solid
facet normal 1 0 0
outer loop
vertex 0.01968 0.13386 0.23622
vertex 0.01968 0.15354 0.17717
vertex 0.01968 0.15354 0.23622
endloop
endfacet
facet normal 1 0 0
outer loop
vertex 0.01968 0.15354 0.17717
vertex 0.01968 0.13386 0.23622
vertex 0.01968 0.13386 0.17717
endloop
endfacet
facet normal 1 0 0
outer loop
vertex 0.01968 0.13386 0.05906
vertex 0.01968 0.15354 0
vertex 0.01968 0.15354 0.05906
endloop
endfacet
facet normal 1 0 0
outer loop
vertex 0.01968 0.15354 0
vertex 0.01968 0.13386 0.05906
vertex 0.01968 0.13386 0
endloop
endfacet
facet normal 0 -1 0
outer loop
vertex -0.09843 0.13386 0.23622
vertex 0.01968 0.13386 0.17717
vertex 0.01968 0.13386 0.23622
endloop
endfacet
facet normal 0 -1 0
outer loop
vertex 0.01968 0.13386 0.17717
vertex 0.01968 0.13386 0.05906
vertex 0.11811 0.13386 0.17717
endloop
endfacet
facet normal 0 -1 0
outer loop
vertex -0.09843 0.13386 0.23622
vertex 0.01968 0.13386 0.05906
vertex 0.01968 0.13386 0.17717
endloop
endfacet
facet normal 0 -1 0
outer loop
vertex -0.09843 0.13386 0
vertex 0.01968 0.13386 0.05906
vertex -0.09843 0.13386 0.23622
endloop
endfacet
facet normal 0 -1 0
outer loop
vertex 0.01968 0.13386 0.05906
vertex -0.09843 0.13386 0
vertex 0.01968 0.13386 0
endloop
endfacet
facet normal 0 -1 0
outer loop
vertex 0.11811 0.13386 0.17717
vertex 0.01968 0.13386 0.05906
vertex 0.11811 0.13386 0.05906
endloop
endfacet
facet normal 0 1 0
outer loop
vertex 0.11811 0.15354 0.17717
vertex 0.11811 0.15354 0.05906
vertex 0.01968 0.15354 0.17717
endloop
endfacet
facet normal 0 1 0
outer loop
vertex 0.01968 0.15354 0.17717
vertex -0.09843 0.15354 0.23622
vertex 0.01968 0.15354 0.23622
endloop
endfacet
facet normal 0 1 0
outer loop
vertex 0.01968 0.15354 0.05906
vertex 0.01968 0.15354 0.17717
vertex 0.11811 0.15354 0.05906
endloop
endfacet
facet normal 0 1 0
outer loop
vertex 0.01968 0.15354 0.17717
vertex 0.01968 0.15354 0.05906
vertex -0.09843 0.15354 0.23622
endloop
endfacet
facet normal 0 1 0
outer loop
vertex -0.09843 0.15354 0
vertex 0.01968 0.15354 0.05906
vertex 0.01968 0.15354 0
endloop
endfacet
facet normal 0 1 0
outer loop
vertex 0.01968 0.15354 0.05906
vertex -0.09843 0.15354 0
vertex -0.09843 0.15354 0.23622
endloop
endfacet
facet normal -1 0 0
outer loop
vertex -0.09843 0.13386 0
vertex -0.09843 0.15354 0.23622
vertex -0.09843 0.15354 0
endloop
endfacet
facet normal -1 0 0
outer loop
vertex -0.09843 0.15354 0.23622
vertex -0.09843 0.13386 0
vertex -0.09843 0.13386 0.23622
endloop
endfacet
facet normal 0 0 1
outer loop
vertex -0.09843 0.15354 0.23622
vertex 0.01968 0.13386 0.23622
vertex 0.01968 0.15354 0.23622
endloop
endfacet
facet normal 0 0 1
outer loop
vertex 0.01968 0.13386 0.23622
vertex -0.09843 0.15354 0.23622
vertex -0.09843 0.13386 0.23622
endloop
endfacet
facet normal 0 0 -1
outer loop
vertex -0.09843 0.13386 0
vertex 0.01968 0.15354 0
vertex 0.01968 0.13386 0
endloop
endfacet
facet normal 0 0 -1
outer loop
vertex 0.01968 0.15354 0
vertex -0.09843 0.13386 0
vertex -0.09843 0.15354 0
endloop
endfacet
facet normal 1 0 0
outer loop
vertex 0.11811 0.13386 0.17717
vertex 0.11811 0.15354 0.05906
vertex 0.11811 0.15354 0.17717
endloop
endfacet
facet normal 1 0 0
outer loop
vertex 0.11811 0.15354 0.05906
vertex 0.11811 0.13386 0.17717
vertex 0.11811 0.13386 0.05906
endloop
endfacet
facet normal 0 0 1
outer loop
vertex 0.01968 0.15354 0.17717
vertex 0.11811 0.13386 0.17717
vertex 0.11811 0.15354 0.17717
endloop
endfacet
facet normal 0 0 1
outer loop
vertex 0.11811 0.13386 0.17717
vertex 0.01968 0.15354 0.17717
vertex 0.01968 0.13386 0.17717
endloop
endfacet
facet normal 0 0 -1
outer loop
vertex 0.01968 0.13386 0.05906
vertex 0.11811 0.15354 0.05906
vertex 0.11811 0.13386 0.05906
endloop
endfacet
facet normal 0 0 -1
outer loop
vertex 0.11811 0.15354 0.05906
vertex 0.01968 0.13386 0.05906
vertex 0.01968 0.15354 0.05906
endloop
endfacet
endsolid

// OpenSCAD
// file: defines.scad
Wb = 1.65;
Hb = 0.68;
H =  1.15;
Wf = 1.20;
Fo = 0.10;

scale = 1/2.54;
// main file
include <defines.scad>

Lh = 0.05;

// Label
scale(scale) color("Green") translate([0, Hb/2 + Lh/2, 0.6/2]) rotate([90,0,0]){

  translate([-0.1, 0, 0]) cube([0.3, 0.6, Lh], center=true);
  translate([ 0.1, 0, 0]) cube([0.4, 0.3, Lh], center=true);
}
